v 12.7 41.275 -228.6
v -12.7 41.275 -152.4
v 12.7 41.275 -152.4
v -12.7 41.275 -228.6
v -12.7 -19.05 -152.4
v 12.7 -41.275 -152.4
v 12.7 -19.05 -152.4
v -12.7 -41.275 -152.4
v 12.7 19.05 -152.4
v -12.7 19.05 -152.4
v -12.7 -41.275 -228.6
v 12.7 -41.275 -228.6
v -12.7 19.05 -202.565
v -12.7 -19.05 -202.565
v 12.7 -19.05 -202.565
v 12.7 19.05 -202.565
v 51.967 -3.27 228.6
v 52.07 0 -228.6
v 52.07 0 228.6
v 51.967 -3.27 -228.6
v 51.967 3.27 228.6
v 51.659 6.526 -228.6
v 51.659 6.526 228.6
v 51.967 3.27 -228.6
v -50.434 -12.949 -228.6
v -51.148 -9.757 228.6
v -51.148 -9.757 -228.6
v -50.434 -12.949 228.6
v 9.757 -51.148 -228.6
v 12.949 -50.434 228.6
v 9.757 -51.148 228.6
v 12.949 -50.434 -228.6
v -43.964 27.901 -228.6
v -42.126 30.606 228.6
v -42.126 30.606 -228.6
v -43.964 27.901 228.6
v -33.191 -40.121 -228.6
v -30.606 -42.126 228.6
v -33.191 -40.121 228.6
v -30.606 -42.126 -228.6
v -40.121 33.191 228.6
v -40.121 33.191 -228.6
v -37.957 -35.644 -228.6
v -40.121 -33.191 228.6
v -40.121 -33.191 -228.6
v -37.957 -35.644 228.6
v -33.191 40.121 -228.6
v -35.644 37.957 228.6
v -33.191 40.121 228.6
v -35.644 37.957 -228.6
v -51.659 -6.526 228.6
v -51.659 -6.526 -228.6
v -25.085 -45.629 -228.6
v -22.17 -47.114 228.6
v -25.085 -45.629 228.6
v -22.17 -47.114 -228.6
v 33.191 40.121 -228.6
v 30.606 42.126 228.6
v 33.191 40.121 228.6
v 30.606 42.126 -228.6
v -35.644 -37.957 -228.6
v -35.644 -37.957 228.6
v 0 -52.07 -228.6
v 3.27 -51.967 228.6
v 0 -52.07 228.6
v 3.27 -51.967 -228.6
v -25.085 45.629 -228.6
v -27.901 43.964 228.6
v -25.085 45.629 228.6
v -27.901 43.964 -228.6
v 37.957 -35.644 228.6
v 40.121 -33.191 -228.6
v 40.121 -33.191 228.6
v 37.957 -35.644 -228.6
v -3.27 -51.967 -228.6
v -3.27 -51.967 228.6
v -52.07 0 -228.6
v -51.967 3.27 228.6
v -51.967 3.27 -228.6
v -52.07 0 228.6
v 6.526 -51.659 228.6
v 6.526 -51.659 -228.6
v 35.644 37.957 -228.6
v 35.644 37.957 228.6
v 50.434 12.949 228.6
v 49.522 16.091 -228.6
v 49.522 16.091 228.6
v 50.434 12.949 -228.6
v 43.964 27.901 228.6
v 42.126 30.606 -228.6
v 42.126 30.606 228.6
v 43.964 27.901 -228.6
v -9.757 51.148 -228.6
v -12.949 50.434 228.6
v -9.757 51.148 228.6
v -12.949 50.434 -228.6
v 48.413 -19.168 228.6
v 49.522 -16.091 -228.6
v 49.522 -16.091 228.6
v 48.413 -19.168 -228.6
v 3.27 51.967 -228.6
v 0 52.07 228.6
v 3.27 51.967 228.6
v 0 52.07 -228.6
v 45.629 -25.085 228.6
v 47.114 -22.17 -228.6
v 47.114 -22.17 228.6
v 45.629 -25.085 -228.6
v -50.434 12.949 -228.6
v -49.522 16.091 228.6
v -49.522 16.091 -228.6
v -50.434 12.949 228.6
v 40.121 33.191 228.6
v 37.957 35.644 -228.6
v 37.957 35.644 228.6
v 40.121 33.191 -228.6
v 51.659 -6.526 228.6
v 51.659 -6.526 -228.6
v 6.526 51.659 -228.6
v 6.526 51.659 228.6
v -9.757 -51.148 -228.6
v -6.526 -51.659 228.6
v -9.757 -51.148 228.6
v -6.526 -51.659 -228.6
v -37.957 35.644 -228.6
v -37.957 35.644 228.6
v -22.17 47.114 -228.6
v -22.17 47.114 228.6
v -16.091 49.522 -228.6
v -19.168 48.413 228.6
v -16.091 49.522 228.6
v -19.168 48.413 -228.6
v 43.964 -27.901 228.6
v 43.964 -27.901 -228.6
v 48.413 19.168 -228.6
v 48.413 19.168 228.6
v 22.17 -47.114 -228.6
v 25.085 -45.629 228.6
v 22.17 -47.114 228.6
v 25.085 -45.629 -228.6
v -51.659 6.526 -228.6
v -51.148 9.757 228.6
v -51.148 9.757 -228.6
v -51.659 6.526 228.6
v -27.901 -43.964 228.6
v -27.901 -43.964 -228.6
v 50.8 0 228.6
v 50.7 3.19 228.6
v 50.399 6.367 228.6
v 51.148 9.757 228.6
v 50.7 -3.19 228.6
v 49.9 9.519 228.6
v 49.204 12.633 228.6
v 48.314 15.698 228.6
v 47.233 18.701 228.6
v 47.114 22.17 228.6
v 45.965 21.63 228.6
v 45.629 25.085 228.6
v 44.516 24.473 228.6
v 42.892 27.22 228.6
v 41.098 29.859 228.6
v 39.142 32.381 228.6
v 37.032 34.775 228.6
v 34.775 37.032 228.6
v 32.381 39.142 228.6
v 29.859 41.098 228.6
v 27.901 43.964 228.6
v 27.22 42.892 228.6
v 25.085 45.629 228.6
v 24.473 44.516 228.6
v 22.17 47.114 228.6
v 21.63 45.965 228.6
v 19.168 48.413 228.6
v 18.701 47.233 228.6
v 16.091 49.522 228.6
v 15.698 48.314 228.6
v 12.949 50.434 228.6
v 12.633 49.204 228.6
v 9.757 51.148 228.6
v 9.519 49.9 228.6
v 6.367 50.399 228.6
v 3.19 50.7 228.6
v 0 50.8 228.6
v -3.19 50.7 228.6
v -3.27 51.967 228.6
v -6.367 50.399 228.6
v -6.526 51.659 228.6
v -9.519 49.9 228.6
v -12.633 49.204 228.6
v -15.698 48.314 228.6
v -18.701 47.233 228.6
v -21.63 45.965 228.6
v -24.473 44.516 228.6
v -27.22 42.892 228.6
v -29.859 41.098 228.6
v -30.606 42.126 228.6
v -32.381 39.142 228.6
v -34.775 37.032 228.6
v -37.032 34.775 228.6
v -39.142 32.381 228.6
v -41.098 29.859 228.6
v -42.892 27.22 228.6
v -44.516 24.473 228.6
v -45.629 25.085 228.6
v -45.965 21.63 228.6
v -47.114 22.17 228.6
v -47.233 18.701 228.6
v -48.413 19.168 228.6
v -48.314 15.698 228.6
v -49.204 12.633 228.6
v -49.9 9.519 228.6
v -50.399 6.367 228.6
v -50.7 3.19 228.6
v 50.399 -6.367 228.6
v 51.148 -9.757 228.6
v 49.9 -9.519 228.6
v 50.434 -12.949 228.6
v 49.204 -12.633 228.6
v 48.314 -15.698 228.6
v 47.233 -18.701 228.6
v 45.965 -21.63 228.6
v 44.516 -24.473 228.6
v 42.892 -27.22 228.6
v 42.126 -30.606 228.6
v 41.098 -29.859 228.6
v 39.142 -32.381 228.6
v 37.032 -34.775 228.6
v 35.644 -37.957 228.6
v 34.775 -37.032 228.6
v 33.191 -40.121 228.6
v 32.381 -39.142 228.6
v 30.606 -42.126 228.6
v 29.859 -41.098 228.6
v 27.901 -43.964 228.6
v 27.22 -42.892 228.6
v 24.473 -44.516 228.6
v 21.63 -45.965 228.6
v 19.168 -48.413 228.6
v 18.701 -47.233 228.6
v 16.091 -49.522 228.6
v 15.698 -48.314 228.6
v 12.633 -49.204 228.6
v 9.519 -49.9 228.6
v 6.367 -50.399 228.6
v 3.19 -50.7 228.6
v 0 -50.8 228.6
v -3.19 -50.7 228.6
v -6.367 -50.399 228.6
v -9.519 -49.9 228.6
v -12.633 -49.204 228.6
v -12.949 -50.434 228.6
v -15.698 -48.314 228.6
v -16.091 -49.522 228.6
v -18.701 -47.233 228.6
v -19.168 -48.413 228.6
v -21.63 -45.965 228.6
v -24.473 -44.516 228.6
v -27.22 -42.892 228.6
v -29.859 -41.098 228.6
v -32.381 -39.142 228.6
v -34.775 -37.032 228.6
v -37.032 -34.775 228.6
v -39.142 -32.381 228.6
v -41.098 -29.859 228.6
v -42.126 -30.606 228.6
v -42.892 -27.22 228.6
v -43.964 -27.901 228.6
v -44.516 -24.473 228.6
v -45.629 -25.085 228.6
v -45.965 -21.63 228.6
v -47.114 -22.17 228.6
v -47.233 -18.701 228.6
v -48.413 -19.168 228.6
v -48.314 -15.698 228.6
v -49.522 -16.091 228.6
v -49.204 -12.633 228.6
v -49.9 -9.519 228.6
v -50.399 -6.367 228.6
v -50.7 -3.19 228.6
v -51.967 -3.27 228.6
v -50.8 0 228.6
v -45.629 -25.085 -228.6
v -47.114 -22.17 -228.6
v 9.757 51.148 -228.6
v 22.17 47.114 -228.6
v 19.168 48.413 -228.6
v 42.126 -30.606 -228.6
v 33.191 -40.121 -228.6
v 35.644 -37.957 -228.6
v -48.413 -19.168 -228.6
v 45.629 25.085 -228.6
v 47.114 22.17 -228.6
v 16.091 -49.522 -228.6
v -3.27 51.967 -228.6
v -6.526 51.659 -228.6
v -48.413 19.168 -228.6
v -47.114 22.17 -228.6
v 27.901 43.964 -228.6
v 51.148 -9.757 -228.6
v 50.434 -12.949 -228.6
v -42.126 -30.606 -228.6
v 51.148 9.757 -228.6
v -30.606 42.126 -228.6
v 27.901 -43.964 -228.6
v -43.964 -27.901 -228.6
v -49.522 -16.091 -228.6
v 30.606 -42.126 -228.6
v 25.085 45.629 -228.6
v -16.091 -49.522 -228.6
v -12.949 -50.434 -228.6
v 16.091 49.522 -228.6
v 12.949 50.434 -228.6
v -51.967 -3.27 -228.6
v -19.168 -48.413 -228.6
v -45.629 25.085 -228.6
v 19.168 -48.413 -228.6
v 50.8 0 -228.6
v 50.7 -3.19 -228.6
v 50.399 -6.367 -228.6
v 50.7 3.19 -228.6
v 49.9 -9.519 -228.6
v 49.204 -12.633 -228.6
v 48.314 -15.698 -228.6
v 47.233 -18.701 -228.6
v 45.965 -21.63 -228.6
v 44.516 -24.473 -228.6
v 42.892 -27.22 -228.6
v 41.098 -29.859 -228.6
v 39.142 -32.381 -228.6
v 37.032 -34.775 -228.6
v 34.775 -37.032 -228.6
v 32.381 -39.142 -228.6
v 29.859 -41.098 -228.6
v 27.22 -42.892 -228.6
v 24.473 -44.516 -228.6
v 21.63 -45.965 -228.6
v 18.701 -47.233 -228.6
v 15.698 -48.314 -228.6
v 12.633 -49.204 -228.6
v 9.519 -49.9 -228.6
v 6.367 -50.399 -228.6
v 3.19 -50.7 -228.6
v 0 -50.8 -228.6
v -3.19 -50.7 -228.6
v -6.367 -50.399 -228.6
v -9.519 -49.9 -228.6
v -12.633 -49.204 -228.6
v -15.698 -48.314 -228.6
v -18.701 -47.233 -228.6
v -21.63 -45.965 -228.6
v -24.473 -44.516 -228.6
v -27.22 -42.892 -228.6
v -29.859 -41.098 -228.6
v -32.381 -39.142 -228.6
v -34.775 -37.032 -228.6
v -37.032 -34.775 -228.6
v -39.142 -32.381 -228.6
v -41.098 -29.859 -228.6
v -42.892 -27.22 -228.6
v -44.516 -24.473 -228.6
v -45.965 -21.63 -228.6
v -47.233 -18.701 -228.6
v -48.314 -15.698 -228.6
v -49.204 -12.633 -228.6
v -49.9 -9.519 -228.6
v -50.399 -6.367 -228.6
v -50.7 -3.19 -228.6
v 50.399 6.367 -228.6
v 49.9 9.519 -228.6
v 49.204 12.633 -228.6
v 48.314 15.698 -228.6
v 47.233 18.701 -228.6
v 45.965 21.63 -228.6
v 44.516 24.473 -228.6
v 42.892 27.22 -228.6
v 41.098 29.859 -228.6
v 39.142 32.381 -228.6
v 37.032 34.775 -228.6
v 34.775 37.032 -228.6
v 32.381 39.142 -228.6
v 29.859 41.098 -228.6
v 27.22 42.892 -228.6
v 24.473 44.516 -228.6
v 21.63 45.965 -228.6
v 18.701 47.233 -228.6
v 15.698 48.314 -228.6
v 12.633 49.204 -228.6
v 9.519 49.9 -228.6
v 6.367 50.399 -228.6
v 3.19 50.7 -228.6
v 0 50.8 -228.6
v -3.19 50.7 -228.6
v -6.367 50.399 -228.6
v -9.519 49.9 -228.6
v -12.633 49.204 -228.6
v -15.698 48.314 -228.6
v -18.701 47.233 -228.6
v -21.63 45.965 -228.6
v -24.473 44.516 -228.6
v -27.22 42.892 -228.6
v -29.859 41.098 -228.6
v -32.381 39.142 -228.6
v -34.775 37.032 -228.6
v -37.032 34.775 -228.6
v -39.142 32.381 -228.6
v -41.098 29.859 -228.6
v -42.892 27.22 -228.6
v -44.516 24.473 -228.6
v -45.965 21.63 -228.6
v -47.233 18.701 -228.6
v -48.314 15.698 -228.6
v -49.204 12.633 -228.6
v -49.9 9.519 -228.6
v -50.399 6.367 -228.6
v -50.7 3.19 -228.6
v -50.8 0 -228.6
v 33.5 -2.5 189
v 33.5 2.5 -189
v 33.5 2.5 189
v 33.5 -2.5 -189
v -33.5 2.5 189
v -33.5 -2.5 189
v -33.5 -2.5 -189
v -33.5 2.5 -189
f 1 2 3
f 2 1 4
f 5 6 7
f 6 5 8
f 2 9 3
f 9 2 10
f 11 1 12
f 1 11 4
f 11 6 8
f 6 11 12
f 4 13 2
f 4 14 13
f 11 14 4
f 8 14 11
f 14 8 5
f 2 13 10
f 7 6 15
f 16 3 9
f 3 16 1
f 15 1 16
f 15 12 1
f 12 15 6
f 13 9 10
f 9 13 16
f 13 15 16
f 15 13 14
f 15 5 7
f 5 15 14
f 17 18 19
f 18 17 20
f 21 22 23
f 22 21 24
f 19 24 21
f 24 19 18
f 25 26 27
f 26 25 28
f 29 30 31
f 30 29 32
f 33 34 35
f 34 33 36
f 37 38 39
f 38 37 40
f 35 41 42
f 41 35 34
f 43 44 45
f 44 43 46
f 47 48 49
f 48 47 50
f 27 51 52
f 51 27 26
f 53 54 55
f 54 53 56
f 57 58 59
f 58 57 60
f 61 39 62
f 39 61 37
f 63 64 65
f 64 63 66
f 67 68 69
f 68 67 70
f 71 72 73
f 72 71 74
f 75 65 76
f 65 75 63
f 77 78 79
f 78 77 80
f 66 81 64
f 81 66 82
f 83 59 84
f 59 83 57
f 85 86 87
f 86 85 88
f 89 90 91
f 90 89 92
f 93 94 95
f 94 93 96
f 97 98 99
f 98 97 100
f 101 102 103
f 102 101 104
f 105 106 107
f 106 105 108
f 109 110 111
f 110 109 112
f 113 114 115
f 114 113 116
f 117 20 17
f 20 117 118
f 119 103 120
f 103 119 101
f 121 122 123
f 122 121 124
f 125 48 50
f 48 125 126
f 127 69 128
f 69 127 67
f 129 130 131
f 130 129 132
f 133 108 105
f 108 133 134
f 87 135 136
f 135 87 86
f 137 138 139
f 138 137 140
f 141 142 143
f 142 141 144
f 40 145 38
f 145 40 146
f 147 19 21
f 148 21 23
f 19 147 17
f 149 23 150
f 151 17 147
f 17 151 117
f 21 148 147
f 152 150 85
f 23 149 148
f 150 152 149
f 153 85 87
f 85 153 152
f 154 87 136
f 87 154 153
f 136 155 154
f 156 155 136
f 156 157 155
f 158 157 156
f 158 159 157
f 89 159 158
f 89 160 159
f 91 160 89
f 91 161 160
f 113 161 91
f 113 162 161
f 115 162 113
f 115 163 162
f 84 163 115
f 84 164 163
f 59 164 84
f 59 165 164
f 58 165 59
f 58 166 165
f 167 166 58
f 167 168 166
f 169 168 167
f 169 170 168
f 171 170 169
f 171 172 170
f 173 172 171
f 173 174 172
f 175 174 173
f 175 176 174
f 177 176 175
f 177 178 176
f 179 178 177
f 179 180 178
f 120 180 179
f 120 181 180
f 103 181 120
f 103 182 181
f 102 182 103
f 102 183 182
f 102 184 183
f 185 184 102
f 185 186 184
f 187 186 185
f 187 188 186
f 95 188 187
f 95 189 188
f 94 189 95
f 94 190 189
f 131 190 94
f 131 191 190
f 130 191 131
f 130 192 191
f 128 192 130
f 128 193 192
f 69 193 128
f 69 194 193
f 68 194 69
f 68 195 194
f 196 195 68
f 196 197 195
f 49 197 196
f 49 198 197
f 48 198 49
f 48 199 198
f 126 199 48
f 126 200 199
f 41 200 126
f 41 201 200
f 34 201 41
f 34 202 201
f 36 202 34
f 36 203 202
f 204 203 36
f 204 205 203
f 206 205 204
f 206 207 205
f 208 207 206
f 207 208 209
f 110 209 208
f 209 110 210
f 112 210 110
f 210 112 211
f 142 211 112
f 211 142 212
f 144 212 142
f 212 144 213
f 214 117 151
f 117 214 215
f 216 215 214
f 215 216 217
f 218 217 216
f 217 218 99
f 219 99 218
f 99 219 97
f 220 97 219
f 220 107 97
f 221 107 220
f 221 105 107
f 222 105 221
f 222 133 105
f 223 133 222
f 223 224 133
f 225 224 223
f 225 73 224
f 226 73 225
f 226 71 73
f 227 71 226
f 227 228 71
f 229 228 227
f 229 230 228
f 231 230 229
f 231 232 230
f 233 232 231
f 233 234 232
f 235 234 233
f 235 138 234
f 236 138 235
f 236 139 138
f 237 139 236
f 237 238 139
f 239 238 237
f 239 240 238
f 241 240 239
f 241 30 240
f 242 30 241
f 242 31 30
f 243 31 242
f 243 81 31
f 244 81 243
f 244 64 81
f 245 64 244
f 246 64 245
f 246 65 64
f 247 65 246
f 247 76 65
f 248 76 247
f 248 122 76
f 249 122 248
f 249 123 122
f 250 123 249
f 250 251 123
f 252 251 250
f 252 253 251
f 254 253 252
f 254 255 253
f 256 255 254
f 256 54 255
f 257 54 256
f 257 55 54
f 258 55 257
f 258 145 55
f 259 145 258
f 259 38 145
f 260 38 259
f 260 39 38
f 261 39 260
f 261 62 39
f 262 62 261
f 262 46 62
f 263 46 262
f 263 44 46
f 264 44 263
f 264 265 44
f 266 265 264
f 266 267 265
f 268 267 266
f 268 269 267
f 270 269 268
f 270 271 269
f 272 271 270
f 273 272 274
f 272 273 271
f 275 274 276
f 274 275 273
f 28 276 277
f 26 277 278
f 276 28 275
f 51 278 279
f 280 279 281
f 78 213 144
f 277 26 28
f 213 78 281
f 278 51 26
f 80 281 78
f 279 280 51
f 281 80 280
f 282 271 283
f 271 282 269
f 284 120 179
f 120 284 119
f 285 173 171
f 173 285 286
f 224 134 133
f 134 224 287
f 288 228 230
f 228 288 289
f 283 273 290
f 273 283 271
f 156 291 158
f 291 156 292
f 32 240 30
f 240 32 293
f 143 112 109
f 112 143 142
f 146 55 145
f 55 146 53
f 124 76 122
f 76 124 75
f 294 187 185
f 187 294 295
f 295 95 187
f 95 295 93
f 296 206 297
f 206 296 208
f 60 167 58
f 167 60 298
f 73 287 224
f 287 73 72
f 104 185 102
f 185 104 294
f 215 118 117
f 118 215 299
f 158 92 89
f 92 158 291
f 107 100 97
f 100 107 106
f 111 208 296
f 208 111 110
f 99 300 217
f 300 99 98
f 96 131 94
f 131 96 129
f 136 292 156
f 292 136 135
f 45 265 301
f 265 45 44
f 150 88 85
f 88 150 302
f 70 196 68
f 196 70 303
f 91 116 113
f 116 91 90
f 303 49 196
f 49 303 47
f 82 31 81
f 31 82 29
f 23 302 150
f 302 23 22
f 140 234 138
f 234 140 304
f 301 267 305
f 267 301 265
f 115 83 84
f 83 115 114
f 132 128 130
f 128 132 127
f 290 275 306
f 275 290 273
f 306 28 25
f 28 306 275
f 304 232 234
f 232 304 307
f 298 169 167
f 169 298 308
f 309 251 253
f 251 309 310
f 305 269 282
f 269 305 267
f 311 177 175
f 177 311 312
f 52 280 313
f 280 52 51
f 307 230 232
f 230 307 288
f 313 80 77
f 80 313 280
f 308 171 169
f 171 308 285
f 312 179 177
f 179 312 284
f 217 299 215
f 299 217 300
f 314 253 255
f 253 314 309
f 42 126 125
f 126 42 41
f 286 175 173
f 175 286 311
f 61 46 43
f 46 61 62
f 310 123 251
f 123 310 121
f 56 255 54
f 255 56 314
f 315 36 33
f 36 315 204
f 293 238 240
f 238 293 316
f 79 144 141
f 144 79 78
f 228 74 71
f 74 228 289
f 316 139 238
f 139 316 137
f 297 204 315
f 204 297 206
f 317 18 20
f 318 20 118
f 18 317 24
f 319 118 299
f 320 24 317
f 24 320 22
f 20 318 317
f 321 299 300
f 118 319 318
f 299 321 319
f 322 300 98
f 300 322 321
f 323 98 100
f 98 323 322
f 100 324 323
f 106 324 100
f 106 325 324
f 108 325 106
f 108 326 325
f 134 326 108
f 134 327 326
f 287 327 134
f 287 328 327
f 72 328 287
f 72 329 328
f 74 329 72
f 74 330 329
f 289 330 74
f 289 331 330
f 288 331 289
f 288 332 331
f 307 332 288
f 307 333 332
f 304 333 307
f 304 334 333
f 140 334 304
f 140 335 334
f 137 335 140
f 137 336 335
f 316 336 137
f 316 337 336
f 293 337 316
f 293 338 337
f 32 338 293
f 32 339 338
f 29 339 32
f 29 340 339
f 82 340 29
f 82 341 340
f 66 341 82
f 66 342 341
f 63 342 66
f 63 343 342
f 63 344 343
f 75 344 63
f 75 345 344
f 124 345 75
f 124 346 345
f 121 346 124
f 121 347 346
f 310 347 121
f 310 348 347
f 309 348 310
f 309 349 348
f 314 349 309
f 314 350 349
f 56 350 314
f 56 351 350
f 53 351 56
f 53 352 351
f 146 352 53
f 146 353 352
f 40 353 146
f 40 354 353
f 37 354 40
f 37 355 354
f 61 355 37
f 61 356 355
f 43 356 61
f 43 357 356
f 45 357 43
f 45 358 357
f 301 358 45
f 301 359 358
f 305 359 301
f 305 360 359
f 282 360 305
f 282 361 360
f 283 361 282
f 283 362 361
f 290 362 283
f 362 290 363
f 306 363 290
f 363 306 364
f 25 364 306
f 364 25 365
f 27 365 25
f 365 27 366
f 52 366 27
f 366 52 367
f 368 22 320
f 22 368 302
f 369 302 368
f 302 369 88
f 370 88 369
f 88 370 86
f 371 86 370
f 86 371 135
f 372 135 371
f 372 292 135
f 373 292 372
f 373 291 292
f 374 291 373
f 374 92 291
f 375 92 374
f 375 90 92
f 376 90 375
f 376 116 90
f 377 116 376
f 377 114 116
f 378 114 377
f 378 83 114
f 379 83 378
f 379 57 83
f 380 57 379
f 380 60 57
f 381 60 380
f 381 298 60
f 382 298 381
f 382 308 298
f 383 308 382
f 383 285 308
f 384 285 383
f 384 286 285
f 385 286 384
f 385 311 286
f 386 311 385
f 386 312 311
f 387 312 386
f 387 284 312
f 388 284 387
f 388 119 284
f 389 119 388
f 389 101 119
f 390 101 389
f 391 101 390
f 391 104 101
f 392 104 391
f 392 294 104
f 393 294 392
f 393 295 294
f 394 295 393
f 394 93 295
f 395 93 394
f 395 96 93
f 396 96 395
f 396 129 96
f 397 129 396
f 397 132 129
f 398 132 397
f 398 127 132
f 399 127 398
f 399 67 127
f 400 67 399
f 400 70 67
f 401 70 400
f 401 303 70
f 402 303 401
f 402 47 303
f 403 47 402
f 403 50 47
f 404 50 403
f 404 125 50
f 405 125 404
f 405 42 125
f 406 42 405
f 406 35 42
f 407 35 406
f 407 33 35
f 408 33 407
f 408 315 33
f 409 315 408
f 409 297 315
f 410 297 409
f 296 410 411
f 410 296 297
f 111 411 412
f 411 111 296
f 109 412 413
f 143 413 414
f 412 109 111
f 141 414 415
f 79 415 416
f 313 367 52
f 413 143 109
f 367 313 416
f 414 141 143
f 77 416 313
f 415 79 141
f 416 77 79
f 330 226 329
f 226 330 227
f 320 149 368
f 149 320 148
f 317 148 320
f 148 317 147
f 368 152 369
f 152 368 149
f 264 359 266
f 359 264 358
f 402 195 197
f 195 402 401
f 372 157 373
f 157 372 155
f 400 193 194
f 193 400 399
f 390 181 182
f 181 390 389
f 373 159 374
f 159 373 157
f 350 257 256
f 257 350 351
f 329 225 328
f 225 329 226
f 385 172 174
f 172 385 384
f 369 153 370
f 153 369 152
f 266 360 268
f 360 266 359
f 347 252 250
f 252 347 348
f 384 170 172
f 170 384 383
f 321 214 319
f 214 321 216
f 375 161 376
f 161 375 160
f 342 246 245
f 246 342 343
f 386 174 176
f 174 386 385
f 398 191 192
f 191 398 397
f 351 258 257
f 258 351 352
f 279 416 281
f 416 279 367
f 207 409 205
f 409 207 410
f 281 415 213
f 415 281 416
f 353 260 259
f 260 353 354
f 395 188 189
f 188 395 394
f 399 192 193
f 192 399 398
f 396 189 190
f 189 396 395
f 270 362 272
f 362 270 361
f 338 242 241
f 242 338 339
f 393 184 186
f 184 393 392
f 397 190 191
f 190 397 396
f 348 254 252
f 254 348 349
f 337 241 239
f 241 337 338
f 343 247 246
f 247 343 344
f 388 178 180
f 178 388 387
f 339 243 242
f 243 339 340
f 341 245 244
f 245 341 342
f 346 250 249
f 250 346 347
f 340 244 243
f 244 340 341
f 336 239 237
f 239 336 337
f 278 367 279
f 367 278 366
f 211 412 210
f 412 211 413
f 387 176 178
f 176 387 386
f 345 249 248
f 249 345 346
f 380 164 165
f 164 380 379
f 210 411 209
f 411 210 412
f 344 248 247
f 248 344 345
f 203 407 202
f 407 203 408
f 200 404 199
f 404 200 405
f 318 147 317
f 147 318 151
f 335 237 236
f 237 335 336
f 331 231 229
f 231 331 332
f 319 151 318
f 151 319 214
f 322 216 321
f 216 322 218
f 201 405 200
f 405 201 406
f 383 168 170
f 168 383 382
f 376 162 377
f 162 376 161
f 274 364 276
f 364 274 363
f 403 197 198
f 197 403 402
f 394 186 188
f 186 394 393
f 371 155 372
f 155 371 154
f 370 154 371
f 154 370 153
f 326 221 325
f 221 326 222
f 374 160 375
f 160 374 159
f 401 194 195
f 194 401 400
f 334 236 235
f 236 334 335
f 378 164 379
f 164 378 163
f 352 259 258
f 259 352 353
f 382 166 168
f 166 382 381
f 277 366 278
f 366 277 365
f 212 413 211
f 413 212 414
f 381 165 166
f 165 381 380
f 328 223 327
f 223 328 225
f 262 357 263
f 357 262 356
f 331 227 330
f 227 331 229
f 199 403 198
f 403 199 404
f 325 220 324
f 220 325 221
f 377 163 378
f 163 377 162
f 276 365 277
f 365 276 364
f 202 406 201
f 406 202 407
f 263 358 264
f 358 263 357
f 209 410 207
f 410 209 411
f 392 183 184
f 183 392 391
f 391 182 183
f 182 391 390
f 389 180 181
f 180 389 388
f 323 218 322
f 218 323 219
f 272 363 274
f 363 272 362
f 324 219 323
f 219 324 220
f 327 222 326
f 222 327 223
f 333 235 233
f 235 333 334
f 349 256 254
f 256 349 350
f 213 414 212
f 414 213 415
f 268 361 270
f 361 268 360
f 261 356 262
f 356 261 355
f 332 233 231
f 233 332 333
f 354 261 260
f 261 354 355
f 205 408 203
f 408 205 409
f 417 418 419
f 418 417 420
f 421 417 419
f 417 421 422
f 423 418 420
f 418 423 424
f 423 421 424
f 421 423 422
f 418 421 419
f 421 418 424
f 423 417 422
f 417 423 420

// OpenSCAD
// https://www.uline.ca/Product/Detail/S-10722/Kraft-Mailing-Tubes/Kraft-Mailing-Tubes-with-End-Caps-4-x-18-080-thick

inch = 25.4;

translate([ 0, 0,inch*3/2-inch*18/2])
    rotate([0,0,90])
        difference()
        {
            cube([inch*3.25, inch*1, inch*3.0], center=true);
            translate([0,0,inch*1.25/2])
            cube([inch*1.5, inch*1.2, inch*2.2], center=true);
        }


translate([ 0, 0,0])
    cube([67, 5, 378], center=true);

difference() 
{
    color("brown",0.45) cylinder(h=18*inch, d = 4.1*inch, center=true, $fn=100);
    color("brown",0.25) cylinder(h=18.2*inch, d = 4*inch, center=true, $fn=100);
}
